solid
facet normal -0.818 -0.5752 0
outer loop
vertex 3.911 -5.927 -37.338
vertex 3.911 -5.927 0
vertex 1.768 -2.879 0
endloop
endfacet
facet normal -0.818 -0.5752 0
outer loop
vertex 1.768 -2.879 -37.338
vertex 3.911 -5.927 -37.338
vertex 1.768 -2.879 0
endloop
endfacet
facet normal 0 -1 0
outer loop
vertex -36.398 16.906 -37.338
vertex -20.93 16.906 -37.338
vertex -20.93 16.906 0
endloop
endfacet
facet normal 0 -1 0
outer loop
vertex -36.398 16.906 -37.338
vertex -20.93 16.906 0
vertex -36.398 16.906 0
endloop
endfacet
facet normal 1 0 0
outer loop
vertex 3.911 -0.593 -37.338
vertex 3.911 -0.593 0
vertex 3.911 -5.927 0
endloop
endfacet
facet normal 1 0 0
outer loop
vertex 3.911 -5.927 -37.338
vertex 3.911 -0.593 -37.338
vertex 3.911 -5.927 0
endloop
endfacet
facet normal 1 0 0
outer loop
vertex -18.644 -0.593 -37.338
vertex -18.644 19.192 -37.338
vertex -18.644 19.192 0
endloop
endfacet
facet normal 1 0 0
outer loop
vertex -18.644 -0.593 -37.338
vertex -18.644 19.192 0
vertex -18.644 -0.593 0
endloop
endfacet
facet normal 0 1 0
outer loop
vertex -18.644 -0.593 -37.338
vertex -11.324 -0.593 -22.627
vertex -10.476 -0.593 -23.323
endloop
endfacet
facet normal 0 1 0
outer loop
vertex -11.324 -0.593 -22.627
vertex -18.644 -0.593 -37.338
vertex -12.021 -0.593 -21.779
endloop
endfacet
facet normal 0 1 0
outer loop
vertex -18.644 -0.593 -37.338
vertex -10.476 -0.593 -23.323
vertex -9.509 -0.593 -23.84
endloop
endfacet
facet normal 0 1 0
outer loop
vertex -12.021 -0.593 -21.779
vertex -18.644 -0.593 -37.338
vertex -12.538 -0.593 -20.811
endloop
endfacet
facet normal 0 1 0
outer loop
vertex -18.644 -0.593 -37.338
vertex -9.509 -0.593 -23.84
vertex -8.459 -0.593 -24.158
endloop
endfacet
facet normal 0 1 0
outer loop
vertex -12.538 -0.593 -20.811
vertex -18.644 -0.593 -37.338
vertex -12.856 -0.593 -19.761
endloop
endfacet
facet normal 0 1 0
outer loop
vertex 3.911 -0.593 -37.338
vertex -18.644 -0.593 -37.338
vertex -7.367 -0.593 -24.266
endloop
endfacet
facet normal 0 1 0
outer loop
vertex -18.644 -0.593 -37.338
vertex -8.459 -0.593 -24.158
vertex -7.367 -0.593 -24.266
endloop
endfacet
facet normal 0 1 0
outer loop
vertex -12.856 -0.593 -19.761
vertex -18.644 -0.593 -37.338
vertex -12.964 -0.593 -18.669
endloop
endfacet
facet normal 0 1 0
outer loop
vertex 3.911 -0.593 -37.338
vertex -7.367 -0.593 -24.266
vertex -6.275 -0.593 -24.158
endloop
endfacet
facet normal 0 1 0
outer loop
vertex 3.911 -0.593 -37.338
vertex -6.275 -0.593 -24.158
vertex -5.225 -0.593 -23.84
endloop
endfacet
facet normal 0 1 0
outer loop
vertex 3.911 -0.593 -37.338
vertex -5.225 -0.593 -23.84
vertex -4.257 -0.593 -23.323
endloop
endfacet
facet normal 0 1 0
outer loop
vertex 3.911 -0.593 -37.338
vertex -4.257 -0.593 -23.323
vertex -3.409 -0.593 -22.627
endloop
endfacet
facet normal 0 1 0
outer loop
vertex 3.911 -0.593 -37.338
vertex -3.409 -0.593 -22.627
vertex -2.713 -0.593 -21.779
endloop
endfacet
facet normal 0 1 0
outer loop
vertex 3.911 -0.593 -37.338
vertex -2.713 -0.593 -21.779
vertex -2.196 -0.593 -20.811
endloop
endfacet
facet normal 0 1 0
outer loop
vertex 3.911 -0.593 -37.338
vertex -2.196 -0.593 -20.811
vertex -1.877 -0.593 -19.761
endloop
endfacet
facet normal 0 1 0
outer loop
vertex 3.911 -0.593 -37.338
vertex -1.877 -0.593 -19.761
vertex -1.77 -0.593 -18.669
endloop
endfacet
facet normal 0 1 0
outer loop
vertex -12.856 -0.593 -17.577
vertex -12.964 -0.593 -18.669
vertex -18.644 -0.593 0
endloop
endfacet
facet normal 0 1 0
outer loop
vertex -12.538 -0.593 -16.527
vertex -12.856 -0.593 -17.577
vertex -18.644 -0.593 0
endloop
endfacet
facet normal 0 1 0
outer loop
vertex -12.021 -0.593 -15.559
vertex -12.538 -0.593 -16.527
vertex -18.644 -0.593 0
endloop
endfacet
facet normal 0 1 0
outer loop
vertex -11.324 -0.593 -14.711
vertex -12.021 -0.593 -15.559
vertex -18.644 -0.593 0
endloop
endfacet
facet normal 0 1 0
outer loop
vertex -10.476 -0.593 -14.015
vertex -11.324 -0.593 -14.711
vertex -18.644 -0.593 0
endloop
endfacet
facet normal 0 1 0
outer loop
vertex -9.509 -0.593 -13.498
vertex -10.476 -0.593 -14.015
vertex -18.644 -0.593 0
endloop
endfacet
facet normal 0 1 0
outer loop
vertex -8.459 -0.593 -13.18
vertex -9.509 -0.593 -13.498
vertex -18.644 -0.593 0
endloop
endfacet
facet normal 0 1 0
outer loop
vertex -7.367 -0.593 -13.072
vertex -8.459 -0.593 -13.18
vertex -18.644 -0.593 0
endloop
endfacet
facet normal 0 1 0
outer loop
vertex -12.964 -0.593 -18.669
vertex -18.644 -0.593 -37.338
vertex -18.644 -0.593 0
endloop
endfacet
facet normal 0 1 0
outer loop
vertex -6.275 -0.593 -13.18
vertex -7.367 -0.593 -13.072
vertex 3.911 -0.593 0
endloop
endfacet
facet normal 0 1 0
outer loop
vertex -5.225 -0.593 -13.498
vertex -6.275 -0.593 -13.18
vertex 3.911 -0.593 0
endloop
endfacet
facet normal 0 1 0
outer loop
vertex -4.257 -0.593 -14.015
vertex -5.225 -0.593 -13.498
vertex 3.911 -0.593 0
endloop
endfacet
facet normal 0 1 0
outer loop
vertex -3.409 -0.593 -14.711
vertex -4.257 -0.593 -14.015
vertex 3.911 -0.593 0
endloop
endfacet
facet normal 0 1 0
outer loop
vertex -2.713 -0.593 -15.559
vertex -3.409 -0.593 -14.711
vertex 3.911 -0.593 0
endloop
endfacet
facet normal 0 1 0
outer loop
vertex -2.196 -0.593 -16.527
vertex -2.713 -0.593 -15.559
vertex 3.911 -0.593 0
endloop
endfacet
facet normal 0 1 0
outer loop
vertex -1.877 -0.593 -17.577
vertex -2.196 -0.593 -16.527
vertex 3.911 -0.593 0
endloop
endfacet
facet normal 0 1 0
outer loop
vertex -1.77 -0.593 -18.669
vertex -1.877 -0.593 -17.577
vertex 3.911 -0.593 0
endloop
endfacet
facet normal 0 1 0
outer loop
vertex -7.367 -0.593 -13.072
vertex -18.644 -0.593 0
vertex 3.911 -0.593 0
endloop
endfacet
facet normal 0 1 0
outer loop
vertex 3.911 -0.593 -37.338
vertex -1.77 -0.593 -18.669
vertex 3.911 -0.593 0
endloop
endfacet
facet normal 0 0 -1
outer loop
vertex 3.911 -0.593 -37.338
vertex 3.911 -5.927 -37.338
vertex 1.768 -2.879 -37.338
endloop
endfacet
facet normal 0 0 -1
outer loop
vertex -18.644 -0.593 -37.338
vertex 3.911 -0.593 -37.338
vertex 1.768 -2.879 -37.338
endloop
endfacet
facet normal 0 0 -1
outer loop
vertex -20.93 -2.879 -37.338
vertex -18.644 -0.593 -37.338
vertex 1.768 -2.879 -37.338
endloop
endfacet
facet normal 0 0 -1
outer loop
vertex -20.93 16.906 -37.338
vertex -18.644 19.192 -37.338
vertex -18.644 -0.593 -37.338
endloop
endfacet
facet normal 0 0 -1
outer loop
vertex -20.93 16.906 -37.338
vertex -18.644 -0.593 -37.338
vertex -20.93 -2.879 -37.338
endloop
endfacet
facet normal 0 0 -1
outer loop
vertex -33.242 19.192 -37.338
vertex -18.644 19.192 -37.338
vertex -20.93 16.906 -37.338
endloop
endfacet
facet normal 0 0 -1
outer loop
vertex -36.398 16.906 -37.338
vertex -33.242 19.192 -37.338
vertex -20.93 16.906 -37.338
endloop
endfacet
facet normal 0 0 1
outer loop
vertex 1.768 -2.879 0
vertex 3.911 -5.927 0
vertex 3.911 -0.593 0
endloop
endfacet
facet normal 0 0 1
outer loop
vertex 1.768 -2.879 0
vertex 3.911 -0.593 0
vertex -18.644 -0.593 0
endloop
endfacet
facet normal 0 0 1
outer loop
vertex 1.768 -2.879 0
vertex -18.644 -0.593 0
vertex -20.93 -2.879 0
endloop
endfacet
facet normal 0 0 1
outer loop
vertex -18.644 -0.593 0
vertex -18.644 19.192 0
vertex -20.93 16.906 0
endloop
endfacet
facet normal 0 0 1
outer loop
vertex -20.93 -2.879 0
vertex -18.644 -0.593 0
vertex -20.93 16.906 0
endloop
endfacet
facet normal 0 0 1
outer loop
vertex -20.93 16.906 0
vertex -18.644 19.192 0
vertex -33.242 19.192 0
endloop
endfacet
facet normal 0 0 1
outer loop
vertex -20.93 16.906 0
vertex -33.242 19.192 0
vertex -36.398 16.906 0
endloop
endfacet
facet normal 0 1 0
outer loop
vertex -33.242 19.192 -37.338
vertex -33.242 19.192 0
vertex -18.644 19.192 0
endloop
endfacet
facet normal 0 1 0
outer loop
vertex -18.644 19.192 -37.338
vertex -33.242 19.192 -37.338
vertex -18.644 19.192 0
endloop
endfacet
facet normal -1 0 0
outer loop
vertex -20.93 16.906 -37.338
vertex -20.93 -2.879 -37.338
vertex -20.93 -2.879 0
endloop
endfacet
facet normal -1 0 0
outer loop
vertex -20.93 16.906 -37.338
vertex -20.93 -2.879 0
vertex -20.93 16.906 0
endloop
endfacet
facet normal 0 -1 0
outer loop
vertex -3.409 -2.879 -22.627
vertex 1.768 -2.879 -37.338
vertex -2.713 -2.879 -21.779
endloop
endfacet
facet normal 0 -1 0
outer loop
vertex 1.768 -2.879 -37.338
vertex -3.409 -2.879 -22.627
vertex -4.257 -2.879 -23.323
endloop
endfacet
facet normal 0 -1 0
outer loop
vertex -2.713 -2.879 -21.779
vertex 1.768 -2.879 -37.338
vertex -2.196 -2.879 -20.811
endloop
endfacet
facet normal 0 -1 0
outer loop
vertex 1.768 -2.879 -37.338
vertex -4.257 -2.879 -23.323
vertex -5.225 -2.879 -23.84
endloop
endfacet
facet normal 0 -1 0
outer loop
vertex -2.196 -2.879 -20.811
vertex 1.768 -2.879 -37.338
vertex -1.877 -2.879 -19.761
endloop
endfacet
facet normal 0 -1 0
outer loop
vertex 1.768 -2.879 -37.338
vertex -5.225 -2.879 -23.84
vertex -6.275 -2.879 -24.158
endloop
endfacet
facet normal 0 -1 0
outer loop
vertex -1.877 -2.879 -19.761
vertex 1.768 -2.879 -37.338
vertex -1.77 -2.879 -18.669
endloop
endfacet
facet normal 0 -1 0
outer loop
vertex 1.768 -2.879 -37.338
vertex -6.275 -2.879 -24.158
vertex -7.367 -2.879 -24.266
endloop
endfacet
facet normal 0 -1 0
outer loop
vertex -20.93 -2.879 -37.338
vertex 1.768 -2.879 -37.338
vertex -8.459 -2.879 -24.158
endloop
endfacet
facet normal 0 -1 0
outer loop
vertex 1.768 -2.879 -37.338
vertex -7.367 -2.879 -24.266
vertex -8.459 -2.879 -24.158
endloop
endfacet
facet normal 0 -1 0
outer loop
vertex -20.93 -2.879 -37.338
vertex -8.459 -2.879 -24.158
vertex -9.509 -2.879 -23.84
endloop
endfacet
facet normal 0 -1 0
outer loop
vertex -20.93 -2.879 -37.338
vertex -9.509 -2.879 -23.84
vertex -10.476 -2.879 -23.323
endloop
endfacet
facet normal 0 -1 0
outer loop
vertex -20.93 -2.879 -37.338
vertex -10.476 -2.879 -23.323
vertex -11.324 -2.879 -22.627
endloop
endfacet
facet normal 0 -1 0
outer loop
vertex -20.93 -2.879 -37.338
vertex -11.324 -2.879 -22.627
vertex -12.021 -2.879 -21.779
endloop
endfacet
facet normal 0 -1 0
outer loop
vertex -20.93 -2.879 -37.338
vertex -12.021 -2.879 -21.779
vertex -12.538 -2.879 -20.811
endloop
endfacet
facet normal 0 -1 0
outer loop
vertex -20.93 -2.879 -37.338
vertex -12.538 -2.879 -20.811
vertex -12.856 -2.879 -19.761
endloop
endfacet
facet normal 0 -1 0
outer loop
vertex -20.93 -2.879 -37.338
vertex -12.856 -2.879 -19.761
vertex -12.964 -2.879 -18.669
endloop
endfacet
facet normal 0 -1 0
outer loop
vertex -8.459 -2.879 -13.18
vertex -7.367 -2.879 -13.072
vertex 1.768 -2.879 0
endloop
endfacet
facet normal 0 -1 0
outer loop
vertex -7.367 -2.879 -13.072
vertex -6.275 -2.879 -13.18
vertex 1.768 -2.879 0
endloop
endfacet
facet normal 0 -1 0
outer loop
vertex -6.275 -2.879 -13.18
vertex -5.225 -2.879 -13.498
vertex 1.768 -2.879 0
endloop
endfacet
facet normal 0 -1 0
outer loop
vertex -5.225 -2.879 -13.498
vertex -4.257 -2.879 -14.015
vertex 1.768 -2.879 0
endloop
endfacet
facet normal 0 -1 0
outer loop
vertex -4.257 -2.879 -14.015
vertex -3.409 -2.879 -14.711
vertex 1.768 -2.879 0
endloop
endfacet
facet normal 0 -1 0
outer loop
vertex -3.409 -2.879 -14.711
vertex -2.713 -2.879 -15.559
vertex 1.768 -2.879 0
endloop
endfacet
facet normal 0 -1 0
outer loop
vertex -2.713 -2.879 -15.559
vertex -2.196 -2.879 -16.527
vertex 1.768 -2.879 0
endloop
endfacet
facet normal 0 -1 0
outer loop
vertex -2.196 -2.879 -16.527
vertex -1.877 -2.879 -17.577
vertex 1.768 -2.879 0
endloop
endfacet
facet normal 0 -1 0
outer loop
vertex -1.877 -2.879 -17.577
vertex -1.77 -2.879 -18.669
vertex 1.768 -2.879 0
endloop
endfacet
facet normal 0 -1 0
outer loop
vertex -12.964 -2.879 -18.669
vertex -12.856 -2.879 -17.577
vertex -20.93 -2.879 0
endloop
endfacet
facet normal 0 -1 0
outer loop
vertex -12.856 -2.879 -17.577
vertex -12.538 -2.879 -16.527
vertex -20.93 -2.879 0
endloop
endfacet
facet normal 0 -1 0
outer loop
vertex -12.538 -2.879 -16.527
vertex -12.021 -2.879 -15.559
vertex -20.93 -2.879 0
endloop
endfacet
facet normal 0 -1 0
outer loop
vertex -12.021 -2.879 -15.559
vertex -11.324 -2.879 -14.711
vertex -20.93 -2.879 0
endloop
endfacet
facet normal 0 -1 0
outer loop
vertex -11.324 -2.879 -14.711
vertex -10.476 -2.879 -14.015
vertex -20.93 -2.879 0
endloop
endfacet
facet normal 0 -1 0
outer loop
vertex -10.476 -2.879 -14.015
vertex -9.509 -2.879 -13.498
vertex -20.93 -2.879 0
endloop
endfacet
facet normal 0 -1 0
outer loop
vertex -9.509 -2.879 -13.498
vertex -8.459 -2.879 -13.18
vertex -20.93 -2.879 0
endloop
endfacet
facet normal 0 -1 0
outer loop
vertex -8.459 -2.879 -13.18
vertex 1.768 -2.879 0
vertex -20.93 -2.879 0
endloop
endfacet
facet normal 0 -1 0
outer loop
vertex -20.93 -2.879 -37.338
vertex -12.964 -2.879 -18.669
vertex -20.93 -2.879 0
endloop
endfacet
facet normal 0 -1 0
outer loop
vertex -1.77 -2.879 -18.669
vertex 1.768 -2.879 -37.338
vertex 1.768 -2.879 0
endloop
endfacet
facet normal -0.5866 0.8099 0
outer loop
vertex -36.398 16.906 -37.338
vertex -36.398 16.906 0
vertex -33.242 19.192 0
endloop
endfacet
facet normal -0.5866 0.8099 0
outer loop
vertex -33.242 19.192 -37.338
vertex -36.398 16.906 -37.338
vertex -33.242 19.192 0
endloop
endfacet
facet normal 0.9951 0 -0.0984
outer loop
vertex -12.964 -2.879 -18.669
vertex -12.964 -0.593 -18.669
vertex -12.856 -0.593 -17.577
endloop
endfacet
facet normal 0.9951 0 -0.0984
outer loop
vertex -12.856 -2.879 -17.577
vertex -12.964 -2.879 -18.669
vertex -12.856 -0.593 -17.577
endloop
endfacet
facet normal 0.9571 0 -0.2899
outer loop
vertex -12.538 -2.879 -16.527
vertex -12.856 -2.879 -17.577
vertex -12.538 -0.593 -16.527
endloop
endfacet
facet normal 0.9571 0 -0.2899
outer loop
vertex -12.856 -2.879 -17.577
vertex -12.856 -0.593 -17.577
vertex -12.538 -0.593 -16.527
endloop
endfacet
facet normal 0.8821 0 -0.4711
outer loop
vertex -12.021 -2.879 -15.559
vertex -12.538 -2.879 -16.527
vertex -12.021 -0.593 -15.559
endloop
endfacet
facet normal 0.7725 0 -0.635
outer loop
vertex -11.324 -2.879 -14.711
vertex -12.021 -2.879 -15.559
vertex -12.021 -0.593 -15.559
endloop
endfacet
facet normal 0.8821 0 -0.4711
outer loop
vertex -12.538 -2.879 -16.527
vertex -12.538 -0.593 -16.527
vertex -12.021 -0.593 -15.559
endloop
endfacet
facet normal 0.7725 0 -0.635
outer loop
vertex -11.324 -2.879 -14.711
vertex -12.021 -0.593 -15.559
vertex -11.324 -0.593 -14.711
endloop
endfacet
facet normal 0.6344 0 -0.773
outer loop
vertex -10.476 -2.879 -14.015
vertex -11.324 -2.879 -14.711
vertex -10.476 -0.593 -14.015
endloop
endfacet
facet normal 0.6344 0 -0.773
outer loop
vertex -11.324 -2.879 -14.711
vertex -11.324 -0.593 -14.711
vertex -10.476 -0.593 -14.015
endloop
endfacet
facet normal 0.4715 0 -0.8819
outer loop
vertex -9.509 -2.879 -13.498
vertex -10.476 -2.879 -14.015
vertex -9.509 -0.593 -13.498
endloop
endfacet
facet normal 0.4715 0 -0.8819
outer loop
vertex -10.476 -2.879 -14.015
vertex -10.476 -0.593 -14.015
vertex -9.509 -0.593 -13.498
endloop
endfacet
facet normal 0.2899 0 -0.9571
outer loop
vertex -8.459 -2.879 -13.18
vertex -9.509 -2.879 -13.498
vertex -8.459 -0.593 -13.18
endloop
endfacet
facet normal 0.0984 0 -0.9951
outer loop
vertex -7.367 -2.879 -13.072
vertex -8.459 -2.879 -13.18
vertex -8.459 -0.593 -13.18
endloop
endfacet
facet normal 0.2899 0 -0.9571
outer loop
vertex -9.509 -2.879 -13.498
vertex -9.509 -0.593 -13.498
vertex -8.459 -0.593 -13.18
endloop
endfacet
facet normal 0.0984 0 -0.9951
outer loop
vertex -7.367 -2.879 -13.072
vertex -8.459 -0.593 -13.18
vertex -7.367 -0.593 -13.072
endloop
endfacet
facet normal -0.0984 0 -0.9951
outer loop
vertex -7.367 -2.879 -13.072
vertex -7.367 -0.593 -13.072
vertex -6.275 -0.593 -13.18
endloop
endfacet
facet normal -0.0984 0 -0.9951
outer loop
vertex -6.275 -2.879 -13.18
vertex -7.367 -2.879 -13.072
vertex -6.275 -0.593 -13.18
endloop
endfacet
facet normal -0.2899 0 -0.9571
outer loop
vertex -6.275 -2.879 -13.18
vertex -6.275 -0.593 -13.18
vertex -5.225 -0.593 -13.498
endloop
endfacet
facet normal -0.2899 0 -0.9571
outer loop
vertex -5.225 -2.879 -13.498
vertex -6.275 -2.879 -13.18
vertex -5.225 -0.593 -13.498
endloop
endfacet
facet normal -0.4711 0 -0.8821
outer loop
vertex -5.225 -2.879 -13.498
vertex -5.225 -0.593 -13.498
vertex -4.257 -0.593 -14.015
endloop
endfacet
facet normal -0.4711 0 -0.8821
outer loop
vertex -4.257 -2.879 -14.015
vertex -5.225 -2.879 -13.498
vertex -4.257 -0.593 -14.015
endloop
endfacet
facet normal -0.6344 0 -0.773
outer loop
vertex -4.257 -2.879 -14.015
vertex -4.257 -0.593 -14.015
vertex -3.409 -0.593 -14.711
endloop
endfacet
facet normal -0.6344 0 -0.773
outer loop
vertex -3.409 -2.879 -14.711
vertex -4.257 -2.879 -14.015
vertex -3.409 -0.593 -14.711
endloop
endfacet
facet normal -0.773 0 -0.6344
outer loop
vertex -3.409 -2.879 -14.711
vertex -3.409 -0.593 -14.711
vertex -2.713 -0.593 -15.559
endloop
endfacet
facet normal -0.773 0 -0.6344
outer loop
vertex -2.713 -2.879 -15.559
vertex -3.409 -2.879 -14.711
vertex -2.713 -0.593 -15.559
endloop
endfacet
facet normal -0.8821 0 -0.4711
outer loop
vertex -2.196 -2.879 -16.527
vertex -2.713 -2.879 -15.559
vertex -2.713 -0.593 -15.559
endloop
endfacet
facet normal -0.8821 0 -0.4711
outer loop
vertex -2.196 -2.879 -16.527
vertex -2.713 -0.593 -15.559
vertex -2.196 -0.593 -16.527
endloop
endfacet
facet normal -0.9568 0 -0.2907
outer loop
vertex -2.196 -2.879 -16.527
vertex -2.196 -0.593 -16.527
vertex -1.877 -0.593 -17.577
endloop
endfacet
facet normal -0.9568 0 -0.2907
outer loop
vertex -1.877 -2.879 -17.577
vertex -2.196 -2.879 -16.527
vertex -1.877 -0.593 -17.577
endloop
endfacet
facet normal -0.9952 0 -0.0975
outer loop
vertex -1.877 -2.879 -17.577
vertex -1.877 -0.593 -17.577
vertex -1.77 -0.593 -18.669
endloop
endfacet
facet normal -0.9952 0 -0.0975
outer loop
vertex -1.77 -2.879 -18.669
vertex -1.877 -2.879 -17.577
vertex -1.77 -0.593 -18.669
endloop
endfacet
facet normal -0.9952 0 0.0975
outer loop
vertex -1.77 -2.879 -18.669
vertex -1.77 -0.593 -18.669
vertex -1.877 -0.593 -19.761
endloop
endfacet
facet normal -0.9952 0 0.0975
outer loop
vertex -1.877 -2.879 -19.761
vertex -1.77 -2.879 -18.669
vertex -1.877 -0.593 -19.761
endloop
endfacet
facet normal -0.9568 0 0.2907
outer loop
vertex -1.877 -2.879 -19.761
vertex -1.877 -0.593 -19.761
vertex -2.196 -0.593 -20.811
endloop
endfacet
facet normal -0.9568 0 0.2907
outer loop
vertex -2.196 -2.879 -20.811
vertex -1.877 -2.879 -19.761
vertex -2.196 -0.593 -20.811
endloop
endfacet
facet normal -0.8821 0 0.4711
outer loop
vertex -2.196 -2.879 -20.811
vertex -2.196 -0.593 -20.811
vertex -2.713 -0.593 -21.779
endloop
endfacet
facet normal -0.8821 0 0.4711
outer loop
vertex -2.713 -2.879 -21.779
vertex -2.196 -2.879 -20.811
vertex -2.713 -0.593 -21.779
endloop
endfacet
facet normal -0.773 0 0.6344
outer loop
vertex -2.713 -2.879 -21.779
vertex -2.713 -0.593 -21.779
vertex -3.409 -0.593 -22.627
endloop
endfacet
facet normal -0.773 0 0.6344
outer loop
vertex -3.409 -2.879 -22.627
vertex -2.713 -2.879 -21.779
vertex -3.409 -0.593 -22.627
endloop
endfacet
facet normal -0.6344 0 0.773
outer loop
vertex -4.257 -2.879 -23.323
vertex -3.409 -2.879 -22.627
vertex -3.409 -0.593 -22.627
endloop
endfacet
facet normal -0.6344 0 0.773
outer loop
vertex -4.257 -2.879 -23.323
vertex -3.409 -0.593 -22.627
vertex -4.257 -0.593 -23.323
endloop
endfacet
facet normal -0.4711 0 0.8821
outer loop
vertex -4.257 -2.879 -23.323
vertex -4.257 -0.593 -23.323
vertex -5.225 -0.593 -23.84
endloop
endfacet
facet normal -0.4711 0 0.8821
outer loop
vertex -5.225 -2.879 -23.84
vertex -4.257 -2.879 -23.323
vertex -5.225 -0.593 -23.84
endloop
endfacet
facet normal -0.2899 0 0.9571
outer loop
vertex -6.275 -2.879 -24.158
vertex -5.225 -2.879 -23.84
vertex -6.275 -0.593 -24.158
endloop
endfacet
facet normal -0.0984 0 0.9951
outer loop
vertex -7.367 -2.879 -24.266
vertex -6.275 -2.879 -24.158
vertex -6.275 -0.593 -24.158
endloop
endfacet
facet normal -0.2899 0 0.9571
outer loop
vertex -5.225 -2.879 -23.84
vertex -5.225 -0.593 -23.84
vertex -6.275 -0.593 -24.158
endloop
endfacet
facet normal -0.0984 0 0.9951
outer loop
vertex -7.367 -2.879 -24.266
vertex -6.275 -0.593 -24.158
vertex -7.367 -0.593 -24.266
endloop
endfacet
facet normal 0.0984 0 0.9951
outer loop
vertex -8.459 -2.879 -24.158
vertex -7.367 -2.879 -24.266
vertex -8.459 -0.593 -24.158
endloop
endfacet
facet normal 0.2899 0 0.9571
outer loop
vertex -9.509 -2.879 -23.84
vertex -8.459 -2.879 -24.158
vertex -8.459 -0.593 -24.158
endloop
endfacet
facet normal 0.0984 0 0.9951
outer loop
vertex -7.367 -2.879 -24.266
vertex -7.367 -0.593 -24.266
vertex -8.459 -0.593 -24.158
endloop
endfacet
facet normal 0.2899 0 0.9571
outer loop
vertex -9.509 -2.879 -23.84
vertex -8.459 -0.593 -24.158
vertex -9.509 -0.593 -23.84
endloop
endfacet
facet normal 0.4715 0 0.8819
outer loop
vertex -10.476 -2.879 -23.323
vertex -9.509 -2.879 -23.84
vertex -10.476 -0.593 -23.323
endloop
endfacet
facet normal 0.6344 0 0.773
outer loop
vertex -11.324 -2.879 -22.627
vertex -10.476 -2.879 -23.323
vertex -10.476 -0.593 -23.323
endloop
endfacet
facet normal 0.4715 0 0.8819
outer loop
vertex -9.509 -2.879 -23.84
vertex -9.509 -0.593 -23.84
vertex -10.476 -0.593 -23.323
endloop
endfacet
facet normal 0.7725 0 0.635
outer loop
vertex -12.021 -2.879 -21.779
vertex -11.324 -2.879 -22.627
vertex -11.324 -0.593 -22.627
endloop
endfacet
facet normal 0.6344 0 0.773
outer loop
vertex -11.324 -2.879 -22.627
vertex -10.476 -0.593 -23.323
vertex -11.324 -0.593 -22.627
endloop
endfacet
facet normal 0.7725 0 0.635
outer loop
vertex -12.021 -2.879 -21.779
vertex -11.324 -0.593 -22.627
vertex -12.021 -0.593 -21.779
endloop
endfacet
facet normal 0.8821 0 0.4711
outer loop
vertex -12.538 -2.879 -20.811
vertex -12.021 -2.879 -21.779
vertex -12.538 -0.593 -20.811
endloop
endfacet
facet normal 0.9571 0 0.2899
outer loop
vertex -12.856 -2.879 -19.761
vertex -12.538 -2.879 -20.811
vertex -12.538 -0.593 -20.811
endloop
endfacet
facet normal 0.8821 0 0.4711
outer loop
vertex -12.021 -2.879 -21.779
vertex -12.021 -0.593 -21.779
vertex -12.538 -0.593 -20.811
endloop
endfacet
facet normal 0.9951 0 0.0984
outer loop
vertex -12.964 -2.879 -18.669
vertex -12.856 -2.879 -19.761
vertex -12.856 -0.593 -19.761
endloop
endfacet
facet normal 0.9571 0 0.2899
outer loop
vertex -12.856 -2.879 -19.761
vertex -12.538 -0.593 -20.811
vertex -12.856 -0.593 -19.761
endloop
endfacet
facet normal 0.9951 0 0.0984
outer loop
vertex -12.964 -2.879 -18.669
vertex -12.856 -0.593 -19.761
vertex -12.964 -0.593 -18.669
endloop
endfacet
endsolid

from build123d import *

# Parameters (mm, degrees)
BOSS_EXTRUDE1_DEPTH = 37.338
SKETCH3_R           = 5.596968057
CUT_EXTRUDE1_DEPTH  = 37.338


with BuildPart() as part:
    # Sketch2 → Boss-Extrude1 (new body)
    with BuildSketch(Plane.XY):
        Polygon((-33.242470299, 19.191529245), (-18.64445456, 19.191529245), (-18.64445456, -0.593055445), (3.910861921, -0.593055445), (3.910861921, -5.927055445), (1.768214677, -2.879055445), (-20.93045456, -2.879055445), (-20.93045456, 16.905529245), (-36.39768935, 16.905529245), align=None)
    extrude(amount=-BOSS_EXTRUDE1_DEPTH)

    # Sketch3 → Cut-Extrude1 (cut)
    with BuildSketch(Plane(origin=(0, -0.593055445, 0), x_dir=(1, 0, 0), z_dir=(0, 1, 0))):
        with Locations(Location((-7.36679632, 18.669, 0), (0, 0, 180))):
            Circle(SKETCH3_R)
    extrude(amount=-CUT_EXTRUDE1_DEPTH, mode=Mode.SUBTRACT)


solid = part.part
